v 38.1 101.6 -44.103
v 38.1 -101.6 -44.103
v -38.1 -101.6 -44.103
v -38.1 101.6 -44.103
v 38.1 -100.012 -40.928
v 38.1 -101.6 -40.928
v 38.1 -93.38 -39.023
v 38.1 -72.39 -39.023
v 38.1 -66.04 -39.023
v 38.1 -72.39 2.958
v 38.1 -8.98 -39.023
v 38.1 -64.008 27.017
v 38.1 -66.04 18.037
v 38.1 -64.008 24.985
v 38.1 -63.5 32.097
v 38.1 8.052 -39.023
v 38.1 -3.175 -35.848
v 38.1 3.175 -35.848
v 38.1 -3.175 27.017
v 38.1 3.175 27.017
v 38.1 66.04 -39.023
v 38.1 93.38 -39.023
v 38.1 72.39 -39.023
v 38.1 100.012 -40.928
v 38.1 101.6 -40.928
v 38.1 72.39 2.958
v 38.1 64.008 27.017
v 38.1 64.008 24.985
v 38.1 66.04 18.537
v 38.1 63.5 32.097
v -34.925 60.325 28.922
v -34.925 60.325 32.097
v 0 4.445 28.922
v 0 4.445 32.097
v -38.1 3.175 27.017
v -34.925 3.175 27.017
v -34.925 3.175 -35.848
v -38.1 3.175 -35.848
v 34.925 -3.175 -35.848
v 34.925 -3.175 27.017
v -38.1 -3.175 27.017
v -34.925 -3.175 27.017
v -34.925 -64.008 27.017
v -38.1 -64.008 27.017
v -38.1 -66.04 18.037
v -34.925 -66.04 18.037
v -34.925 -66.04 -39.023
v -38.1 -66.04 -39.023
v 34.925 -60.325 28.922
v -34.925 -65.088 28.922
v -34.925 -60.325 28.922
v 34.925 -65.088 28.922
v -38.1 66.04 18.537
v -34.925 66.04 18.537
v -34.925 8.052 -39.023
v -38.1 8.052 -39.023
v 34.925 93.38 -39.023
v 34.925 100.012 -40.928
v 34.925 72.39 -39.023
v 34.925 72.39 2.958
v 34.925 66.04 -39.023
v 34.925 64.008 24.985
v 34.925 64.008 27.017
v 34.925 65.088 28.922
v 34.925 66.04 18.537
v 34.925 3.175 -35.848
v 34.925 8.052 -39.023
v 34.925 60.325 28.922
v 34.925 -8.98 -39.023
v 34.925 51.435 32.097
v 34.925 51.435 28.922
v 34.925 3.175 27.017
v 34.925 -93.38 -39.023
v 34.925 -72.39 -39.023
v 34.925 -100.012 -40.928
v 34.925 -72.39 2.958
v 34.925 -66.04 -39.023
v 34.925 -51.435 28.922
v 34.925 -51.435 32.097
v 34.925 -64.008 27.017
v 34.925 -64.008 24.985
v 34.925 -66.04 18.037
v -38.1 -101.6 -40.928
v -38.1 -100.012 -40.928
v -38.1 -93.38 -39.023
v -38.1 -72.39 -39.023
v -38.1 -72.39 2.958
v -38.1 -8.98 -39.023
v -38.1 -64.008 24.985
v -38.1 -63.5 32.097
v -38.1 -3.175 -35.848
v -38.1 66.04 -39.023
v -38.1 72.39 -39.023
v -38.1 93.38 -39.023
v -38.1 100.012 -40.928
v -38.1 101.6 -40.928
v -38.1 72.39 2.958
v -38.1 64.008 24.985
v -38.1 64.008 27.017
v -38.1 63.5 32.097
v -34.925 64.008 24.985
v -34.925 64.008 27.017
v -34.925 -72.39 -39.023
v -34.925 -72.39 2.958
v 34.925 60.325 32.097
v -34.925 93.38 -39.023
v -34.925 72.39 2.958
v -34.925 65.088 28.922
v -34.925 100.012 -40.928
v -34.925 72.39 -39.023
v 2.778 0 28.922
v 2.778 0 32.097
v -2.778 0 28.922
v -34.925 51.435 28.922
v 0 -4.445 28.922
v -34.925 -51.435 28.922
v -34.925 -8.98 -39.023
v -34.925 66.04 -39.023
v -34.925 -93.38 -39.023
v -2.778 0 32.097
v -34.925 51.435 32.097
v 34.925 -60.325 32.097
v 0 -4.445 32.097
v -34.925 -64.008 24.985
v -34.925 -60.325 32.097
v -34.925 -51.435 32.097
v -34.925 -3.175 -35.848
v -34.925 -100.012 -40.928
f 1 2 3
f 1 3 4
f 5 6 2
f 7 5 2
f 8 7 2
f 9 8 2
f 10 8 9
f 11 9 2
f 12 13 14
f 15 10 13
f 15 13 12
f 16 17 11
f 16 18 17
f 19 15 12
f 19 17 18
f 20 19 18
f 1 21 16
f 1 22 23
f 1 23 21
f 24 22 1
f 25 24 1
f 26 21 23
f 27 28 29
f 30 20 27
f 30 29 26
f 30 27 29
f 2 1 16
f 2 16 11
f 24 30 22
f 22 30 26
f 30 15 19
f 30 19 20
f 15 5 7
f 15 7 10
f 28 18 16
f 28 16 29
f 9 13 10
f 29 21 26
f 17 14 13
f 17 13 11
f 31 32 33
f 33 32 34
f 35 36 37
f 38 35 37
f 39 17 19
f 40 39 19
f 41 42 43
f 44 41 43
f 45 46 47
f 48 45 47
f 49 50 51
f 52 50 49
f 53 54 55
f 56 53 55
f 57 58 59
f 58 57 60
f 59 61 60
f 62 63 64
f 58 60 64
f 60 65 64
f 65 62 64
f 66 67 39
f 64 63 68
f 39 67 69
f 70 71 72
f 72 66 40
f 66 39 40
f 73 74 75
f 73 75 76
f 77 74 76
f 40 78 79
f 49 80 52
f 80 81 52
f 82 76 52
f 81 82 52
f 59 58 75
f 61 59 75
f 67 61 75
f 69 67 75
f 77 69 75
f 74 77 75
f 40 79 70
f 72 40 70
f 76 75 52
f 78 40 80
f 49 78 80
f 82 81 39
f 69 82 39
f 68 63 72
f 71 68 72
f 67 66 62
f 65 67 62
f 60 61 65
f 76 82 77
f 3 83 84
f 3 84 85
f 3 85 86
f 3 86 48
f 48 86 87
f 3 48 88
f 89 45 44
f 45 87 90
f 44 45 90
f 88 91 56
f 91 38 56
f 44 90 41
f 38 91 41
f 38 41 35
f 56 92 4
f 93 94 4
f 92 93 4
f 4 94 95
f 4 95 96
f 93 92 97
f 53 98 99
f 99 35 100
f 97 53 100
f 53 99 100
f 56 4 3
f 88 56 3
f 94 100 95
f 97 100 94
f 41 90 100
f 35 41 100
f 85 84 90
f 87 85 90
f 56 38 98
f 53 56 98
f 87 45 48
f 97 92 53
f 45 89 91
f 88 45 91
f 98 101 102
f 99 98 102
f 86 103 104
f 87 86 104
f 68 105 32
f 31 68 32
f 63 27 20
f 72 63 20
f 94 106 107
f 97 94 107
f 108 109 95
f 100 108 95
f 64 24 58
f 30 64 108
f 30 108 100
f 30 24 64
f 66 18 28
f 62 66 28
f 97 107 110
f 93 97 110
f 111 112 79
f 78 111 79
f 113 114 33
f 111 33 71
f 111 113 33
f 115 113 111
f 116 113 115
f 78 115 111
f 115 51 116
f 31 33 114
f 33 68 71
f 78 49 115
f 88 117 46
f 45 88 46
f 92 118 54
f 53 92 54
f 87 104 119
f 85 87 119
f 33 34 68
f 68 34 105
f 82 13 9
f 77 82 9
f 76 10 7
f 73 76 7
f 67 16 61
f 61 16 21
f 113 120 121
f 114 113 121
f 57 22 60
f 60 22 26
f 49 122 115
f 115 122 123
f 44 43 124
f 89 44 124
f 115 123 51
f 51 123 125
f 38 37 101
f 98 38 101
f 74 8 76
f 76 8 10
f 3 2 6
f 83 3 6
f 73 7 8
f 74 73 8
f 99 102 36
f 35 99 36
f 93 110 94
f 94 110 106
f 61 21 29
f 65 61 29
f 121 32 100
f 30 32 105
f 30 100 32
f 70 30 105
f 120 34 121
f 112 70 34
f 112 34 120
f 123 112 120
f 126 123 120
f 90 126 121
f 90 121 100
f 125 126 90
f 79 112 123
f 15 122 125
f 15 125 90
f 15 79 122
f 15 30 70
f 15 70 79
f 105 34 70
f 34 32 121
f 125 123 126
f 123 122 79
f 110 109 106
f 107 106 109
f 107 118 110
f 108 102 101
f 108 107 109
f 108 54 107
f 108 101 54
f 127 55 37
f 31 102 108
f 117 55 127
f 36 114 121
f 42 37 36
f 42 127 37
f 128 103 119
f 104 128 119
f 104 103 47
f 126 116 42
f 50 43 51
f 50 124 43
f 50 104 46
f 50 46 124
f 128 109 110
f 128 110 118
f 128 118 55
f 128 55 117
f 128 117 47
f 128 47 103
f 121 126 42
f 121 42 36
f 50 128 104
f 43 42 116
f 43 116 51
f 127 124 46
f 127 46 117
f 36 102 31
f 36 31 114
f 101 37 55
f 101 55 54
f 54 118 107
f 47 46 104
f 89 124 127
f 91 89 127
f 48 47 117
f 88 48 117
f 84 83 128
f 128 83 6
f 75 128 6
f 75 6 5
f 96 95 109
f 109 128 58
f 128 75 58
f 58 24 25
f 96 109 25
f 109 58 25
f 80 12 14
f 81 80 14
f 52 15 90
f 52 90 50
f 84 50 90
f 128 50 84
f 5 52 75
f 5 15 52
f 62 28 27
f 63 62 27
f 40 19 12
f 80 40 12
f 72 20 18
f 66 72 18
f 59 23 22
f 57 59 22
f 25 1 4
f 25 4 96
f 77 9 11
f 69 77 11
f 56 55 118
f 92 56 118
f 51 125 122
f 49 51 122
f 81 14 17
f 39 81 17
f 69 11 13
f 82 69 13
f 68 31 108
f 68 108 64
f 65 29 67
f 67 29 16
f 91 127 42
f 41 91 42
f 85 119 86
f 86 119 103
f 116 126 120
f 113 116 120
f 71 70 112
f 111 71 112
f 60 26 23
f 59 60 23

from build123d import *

# Parameters (mm, degrees)
F1_DEPTH = 38.1
F2_W     = 69.85
F2_H     = 69.85
F3_DEPTH = 127
F5_DEPTH = 76.2
F7_DEPTH = 5.588
F8_W     = 5.08
F8_H     = 3.175
F9_DEPTH = 76.2


with BuildPart() as f1:
    # F0 (on Right) → F1 (new body, symmetric)
    with BuildSketch(Plane.YZ):
        Polygon((-63.5, 32.0970378816), (-101.6, -44.1029621184), (101.6, -44.1029621184), (63.5, 32.0970378816), align=None)
    extrude(amount=F1_DEPTH, both=True)

    # F2 (on Front) → F3 (cut, symmetric)
    with BuildSketch(Plane.XZ):
        with Locations((0, -6.0029621184)):
            Rectangle(F2_W, F2_H)
    extrude(amount=F3_DEPTH, both=True, mode=Mode.SUBTRACT)

    # F4 (on face) → F5 (cut)
    with BuildSketch(Plane.YZ.offset(38.1)):
        Polygon((-72.39, 2.9578125559), (-93.3803873372, -39.0229621184), (-72.39, -39.0229621184), align=None)
        Polygon((-66.04, 18.0367817605), (-66.04, -39.0229621184), (-8.9802561211, -39.0229621184), align=None)
        Polygon((-3.175, 27.0170378816), (-64.008, 27.0170378816), (-64.008, 24.9850378816), (-3.175, -35.8479621184), align=None)
        Polygon((64.008, 27.0170378816), (3.175, 27.0170378816), (3.175, -35.8479621184), (64.008, 24.9850378816), align=None)
        Polygon((66.04, 18.5374412686), (8.0518, -39.0229621184), (66.04, -39.0229621184), align=None)
        Polygon((72.39, -39.0229621184), (93.3803873372, -39.0229621184), (72.39, 2.9578125559), align=None)
    extrude(amount=-F5_DEPTH, mode=Mode.SUBTRACT)

    # F6 (on face) → F7 (cut)
    with BuildSketch(Plane.XY.offset(32.0970378816)):
        Polygon((-34.925, 51.435), (-34.925, -51.435), (-2.778125, 0), align=None)
        Polygon((0, 4.445), (34.925, 60.325), (-34.925, 60.325), align=None)
        Polygon((2.778125, 0), (34.925, -51.435), (34.925, 51.435), align=None)
        Polygon((-34.925, -60.325), (34.925, -60.325), (0, -4.445), align=None)
    extrude(amount=-F7_DEPTH, mode=Mode.SUBTRACT)

    # F8 (on face) → F9 (join)
    with BuildSketch(Plane.YZ.offset(38.1)):
        with Locations((-99.06, -42.5154621184)):
            Rectangle(F8_W, F8_H)
        with Locations((99.06, -42.5154621184)):
            Rectangle(F8_W, F8_H)
    extrude(amount=-F9_DEPTH)


solid = f1.part
